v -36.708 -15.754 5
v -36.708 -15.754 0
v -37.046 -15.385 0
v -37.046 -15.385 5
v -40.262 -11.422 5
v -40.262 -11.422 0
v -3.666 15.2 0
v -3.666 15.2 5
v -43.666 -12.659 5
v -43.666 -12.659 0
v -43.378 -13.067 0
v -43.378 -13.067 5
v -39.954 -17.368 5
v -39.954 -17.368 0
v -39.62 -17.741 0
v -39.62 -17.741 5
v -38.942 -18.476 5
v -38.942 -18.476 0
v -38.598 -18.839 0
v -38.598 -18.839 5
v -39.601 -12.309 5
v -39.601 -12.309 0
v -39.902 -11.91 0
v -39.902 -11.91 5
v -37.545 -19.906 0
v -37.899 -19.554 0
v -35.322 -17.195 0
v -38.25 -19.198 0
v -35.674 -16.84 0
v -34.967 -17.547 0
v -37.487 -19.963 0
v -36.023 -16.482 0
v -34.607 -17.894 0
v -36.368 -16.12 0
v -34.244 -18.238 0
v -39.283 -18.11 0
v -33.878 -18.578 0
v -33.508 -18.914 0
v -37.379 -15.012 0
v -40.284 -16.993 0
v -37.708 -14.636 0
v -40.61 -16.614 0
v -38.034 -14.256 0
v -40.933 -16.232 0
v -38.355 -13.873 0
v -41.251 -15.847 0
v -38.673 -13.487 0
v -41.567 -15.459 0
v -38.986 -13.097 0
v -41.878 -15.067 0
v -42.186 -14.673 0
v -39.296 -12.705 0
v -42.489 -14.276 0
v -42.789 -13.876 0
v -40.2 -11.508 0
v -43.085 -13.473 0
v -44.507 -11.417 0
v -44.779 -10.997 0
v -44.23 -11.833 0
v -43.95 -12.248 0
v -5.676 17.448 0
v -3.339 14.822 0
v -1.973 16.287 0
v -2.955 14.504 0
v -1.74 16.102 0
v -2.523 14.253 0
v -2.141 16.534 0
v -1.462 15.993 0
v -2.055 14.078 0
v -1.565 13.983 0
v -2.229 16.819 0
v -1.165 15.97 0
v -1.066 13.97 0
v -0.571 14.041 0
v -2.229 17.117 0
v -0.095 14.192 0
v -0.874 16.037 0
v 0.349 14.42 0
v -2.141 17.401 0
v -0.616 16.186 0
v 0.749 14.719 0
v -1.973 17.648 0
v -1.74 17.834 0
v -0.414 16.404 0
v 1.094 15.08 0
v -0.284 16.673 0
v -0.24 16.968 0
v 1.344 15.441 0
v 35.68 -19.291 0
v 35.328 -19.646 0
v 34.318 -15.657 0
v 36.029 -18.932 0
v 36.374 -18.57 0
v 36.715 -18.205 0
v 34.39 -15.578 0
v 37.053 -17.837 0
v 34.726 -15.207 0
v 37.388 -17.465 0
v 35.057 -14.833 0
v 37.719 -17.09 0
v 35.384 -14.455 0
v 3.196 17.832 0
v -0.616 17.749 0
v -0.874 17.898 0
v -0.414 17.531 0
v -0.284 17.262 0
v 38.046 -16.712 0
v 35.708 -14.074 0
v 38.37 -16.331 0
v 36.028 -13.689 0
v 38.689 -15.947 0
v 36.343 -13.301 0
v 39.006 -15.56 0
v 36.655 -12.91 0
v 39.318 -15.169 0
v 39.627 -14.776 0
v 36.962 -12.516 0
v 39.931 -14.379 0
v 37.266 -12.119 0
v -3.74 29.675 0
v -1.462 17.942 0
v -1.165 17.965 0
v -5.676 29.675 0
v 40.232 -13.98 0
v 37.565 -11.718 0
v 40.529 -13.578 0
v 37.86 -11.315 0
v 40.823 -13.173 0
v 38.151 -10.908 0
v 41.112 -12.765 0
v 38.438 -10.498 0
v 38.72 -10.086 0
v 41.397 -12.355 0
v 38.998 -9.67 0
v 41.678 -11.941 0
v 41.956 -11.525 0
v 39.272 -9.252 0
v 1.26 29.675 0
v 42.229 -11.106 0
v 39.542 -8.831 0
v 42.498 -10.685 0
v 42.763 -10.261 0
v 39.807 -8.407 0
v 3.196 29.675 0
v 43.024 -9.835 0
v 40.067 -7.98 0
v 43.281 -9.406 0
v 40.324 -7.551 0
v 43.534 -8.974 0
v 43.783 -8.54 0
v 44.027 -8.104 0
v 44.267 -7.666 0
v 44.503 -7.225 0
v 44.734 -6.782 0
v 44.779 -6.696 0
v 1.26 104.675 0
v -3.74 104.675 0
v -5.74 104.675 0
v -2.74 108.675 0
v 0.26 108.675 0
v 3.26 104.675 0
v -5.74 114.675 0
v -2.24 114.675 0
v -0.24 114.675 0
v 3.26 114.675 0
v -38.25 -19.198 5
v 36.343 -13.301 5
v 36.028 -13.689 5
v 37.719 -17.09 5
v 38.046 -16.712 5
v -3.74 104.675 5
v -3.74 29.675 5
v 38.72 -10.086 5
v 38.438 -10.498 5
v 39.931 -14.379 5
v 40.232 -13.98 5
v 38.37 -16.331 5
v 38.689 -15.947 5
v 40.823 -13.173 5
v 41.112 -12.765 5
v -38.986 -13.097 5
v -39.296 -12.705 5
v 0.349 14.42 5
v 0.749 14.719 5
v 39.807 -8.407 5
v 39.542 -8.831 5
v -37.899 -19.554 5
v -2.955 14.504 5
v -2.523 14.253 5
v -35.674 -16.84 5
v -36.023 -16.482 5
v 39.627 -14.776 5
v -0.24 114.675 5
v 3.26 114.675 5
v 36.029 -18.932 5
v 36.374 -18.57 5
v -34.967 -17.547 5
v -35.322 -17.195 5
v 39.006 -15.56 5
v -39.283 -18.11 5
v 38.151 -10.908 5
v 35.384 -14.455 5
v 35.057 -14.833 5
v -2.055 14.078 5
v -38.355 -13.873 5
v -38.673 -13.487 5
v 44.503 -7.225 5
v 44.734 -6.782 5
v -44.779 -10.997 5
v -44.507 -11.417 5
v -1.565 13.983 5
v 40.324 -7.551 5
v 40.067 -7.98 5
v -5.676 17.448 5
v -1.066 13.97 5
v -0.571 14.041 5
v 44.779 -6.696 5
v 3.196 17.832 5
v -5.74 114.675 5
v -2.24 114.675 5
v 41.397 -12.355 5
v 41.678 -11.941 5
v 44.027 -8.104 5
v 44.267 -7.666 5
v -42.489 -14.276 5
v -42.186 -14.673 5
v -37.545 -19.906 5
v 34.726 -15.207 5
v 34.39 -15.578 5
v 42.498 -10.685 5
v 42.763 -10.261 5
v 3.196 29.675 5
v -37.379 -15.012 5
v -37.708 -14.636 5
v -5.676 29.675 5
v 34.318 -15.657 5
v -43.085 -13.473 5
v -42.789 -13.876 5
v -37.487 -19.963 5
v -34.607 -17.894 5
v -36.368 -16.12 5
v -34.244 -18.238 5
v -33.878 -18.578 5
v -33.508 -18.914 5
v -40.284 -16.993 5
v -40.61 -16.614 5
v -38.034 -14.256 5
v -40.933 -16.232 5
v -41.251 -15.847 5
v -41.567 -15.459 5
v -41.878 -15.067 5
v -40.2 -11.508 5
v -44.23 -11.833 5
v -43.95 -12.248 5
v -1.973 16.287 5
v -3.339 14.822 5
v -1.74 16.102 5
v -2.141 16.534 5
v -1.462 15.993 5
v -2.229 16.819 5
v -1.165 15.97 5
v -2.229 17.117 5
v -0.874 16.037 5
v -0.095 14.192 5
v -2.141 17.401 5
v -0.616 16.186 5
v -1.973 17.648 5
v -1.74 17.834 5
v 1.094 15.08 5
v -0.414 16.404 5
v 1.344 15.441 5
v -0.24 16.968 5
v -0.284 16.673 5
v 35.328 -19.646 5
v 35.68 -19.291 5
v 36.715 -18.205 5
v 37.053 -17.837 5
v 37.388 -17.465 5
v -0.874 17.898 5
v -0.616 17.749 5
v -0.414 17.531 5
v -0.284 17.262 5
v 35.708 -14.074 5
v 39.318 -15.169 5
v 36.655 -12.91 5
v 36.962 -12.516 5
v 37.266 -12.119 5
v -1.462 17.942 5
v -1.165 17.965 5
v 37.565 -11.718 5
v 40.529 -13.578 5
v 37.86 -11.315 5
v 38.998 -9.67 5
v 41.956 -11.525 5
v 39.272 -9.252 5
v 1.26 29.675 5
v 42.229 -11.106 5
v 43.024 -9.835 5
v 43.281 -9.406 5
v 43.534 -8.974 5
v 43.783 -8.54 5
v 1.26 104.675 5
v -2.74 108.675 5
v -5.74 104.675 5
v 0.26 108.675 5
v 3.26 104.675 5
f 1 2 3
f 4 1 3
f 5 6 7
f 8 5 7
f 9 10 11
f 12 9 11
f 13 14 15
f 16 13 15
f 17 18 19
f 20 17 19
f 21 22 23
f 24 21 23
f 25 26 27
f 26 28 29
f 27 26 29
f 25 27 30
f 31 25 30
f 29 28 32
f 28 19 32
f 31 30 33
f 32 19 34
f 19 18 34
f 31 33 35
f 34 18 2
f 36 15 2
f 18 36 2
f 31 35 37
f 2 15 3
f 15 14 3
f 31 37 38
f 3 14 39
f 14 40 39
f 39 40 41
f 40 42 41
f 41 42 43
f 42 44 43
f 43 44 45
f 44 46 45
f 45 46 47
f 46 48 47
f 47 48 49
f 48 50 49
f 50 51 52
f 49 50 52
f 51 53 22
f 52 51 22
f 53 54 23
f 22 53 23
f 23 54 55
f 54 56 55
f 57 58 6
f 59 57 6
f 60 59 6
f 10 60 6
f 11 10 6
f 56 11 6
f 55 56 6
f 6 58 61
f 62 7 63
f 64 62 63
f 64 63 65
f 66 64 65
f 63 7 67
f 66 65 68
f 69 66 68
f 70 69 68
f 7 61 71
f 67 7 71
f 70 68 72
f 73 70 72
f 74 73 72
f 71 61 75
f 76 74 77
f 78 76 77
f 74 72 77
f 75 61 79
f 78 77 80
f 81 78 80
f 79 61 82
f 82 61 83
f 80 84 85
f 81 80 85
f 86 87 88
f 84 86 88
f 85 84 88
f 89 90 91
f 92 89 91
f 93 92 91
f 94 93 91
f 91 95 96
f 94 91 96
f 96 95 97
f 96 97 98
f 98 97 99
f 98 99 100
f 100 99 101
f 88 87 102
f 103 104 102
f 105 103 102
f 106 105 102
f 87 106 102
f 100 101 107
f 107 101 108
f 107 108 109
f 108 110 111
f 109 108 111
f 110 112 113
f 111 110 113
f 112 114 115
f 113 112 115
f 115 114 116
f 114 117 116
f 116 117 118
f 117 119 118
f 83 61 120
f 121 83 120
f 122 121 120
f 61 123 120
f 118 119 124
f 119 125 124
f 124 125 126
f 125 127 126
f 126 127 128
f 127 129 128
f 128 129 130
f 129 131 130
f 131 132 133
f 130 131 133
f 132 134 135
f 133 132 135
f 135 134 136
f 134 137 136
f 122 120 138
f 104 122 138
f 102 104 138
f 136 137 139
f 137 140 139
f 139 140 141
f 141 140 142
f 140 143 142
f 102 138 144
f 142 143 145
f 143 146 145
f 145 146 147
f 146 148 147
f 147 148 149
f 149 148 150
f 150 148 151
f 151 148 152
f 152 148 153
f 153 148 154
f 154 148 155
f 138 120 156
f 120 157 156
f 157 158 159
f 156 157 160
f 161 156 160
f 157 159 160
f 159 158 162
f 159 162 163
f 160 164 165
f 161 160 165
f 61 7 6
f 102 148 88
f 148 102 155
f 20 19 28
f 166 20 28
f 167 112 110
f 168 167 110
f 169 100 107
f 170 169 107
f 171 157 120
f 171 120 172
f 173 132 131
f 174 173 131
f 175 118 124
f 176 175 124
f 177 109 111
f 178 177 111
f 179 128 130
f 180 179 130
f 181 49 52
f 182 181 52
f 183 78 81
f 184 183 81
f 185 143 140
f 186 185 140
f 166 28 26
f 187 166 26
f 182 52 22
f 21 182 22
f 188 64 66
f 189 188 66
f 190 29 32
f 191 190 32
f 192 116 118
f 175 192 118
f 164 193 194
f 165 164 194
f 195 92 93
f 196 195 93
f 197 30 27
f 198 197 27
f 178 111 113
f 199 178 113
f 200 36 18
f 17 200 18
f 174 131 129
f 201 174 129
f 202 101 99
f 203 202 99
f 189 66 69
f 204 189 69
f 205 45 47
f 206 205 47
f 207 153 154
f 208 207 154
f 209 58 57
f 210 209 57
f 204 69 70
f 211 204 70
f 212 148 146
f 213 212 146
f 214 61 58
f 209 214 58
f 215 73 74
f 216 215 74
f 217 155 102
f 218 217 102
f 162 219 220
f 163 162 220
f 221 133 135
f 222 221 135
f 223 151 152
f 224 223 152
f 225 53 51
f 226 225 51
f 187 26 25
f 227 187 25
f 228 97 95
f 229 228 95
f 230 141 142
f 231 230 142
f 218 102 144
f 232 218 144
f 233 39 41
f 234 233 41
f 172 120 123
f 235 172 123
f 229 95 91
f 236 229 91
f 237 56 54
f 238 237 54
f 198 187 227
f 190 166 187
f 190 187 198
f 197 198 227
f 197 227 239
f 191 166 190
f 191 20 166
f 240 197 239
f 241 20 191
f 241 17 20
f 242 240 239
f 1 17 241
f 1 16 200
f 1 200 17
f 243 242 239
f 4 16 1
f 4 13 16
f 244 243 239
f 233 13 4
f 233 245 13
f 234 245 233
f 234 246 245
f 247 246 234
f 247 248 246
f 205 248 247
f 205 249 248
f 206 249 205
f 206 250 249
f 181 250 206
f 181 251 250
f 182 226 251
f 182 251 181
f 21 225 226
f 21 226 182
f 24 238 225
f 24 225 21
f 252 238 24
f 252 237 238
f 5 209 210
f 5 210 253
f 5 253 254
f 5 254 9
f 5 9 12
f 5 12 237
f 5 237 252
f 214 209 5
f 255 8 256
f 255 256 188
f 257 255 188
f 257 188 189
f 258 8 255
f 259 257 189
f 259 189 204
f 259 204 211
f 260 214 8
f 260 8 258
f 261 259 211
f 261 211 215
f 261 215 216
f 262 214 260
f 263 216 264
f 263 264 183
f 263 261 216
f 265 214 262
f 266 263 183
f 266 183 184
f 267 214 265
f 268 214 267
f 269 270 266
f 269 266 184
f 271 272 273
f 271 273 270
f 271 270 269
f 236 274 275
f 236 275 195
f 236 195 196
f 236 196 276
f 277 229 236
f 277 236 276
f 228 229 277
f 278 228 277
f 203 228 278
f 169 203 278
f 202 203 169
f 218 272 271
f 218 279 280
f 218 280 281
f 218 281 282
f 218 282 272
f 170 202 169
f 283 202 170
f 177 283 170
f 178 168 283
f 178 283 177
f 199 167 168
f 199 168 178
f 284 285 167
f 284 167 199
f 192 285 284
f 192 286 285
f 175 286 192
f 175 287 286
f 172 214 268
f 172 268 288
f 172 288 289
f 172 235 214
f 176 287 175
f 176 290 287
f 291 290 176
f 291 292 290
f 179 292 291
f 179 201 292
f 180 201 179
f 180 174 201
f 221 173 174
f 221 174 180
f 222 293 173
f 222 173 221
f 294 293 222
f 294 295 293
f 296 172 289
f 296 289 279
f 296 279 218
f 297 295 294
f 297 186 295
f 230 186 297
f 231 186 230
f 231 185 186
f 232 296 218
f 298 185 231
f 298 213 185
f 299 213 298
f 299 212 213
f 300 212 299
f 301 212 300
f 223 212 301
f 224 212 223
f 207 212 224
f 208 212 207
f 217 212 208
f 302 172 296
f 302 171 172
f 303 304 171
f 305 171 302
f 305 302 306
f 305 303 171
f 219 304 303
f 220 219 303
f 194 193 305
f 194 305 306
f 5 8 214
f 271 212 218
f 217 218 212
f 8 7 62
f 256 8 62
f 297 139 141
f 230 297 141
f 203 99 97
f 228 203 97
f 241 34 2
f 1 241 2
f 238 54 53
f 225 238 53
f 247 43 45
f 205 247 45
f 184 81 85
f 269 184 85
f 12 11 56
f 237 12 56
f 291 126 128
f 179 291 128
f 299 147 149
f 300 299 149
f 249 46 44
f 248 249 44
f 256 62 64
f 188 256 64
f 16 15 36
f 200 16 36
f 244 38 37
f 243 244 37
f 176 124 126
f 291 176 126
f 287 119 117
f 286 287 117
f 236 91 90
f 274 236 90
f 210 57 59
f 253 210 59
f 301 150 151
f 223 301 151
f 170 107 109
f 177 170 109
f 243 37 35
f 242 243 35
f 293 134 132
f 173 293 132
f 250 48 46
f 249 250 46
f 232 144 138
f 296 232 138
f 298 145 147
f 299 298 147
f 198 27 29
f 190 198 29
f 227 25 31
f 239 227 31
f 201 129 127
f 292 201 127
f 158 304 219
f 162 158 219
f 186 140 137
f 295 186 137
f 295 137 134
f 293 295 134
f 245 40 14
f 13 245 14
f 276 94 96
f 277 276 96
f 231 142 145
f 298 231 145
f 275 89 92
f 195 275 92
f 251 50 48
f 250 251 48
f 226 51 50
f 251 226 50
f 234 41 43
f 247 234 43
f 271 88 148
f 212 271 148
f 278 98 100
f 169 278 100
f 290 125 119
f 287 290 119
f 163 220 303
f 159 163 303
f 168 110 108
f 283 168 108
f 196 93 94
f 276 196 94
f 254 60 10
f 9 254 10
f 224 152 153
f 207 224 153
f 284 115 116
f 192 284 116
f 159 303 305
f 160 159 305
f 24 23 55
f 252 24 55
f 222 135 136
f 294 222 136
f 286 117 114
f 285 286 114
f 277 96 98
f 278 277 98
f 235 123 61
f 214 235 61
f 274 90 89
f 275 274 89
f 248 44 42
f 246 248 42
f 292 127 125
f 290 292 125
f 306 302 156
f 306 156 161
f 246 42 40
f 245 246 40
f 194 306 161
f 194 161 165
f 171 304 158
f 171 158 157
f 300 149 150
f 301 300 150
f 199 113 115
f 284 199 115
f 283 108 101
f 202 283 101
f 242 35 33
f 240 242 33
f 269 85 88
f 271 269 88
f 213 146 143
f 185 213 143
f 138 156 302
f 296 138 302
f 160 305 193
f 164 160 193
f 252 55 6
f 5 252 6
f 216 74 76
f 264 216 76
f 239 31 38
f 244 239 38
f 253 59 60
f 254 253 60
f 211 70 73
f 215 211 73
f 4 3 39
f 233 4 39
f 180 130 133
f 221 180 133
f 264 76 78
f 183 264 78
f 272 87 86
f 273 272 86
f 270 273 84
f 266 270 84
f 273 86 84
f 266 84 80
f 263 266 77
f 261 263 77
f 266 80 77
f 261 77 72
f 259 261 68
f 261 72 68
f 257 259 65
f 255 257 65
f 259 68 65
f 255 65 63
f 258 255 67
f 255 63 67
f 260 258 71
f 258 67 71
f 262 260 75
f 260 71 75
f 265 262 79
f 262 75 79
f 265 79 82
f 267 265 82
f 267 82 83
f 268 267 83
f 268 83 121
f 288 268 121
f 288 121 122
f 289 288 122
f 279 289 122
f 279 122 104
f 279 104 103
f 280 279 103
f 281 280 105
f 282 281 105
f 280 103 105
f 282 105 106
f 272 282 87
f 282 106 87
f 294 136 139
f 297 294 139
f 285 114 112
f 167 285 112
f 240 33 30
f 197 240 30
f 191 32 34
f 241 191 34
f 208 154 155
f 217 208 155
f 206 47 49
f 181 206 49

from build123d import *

# Parameters (mm, degrees)
F1_DEPTH = 5
F2_W     = 5
F2_H     = 5
F3_DEPTH = 85
F4_W     = 2
F4_H     = 10
F5_DEPTH = 5
F6_DEPTH = 5
F7_R     = 1
F8_DEPTH = 10


with BuildPart() as f1:
    # F0 (on Top) → F1 (new body)
    with BuildSketch(Plane.XY):
        Polygon((3.1958913997, 17.8316862418), (3.1958913997, 29.6752474937), (-5.6755073997, 29.6752474937), (-5.6755073997, 17.4481306137), (-3.004598, 19.391063), (-2.590673, 19.643703), (-2.127576, 19.830687), (-1.639877, 19.938255), (-1.14109, 19.963425), (-0.645039, 19.905499), (-0.165471, 19.766083), (0.284322, 19.549041), align=None)
        with BuildLine():
            Line((44.778874, -6.695544), (3.1958913997, 17.8316862418))
            Line((3.1958913997, 17.8316862418), (3.1958913997, 16.96755))
            Line((3.1958913997, 16.96755), (-0.239810875, 16.96755))
            ThreePointArc((-0.239810875, 16.96755), (-1.239808, 15.967552875), (-2.239805125, 16.96755))
            Line((-2.239805125, 16.96755), (-5.6755073997, 16.96755))
            Line((-5.6755073997, 16.96755), (-5.6755073997, 17.4481306137))
            Line((-5.6755073997, 17.4481306137), (-44.778874, -10.997311))
            Line((-44.778874, -10.997311), (-44.506651, -11.416707))
            Line((-44.506651, -11.416707), (-44.230389, -11.833453))
            Line((-44.230389, -11.833453), (-43.950113, -12.24751))
            Line((-43.950113, -12.24751), (-43.66585, -12.65884))
            Line((-43.66585, -12.65884), (-43.377624, -13.067404))
            Line((-43.377624, -13.067404), (-43.085465, -13.473164))
            Line((-43.085465, -13.473164), (-42.789399, -13.876081))
            Line((-42.789399, -13.876081), (-42.489453, -14.276119))
            Line((-42.489453, -14.276119), (-42.185655, -14.673241))
            Line((-42.185655, -14.673241), (-41.878035, -15.067408))
            Line((-41.878035, -15.067408), (-41.56662, -15.458584))
            Line((-41.56662, -15.458584), (-41.25144, -15.846733))
            Line((-41.25144, -15.846733), (-40.932525, -16.231819))
            Line((-40.932525, -16.231819), (-40.609903, -16.613804))
            Line((-40.609903, -16.613804), (-40.283605, -16.992655))
            Line((-40.283605, -16.992655), (-39.953662, -17.368335))
            Line((-39.953662, -17.368335), (-39.620104, -17.74081))
            Line((-39.620104, -17.74081), (-39.282963, -18.110044))
            Line((-39.282963, -18.110044), (-38.942269, -18.476003))
            Line((-38.942269, -18.476003), (-38.598056, -18.838653))
            Line((-38.598056, -18.838653), (-38.250354, -19.19796))
            Line((-38.250354, -19.19796), (-37.899197, -19.553891))
            Line((-37.899197, -19.553891), (-37.544616, -19.906411))
            Line((-37.544616, -19.906411), (-37.486622, -19.963425))
            Line((-37.486622, -19.963425), (-33.507621, -18.914429))
            Line((-33.507621, -18.914429), (-33.877651, -18.578163))
            Line((-33.877651, -18.578163), (-34.244177, -18.23808))
            Line((-34.244177, -18.23808), (-34.60716, -17.894218))
            Line((-34.60716, -17.894218), (-34.966561, -17.546614))
            Line((-34.966561, -17.546614), (-35.322341, -17.195304))
            Line((-35.322341, -17.195304), (-35.674461, -16.840326))
            Line((-35.674461, -16.840326), (-36.022885, -16.481719))
            Line((-36.022885, -16.481719), (-36.367574, -16.119522))
            Line((-36.367574, -16.119522), (-36.708491, -15.753772))
            Line((-36.708491, -15.753772), (-37.045601, -15.384509))
            Line((-37.045601, -15.384509), (-37.378867, -15.011774))
            Line((-37.378867, -15.011774), (-37.708252, -14.635605))
            Line((-37.708252, -14.635605), (-38.033722, -14.256044))
            Line((-38.033722, -14.256044), (-38.355242, -13.87313))
            Line((-38.355242, -13.87313), (-38.672778, -13.486906))
            Line((-38.672778, -13.486906), (-38.986294, -13.097412))
            Line((-38.986294, -13.097412), (-39.295758, -12.704691))
            Line((-39.295758, -12.704691), (-39.601136, -12.308785))
            Line((-39.601136, -12.308785), (-39.902395, -11.909735))
            Line((-39.902395, -11.909735), (-40.199504, -11.507586))
            Line((-40.199504, -11.507586), (-40.262255, -11.421522))
            Line((-40.262255, -11.421522), (-3.665827, 15.200266))
            Line((-3.665827, 15.200266), (-3.339439, 14.822254))
            Line((-3.339439, 14.822254), (-2.954863, 14.503627))
            Line((-2.954863, 14.503627), (-2.522758, 14.253214))
            Line((-2.522758, 14.253214), (-2.055097, 14.077956))
            Line((-2.055097, 14.077956), (-1.564842, 13.982709))
            Line((-1.564842, 13.982709), (-1.06558, 13.970114))
            Line((-1.06558, 13.970114), (-0.571146, 14.040519))
            Line((-0.571146, 14.040519), (-0.095243, 14.191973))
            Line((-0.095243, 14.191973), (0.34894, 14.420279))
            Line((0.34894, 14.420279), (0.749093, 14.719109))
            Line((0.749093, 14.719109), (1.094126, 15.080183))
            Line((1.094126, 15.080183), (1.344177, 15.440914))
            Line((1.344177, 15.440914), (40.323708, -7.550701))
            Line((40.323708, -7.550701), (40.067458, -7.980043))
            Line((40.067458, -7.980043), (39.806774, -8.406706))
            Line((39.806774, -8.406706), (39.541683, -8.830645))
            Line((39.541683, -8.830645), (39.272214, -9.251815))
            Line((39.272214, -9.251815), (38.998395, -9.67017))
            Line((38.998395, -9.67017), (38.720256, -10.085665))
            Line((38.720256, -10.085665), (38.437827, -10.498257))
            Line((38.437827, -10.498257), (38.151138, -10.907899))
            Line((38.151138, -10.907899), (37.86022, -11.31455))
            Line((37.86022, -11.31455), (37.565104, -11.718164))
            Line((37.565104, -11.718164), (37.265821, -12.118698))
            Line((37.265821, -12.118698), (36.962405, -12.51611))
            Line((36.962405, -12.51611), (36.654888, -12.910357))
            Line((36.654888, -12.910357), (36.343302, -13.301397))
            Line((36.343302, -13.301397), (36.02768, -13.689187))
            Line((36.02768, -13.689187), (35.708058, -14.073686))
            Line((35.708058, -14.073686), (35.384469, -14.454852))
            Line((35.384469, -14.454852), (35.056948, -14.832646))
            Line((35.056948, -14.832646), (34.72553, -15.207025))
            Line((34.72553, -15.207025), (34.390251, -15.57795))
            Line((34.390251, -15.57795), (34.318334, -15.656515))
            Line((34.318334, -15.656515), (35.327871, -19.64571))
            Line((35.327871, -19.64571), (35.67992, -19.290661))
            Line((35.67992, -19.290661), (36.028522, -18.932227))
            Line((36.028522, -18.932227), (36.373644, -18.570442))
            Line((36.373644, -18.570442), (36.715254, -18.205338))
            Line((36.715254, -18.205338), (37.05332, -17.836951))
            Line((37.05332, -17.836951), (37.387811, -17.465314))
            Line((37.387811, -17.465314), (37.718695, -17.090462))
            Line((37.718695, -17.090462), (38.045942, -16.712431))
            Line((38.045942, -16.712431), (38.369521, -16.331256))
            Line((38.369521, -16.331256), (38.689401, -15.946971))
            Line((38.689401, -15.946971), (39.005553, -15.559614))
            Line((39.005553, -15.559614), (39.317948, -15.16922))
            Line((39.317948, -15.16922), (39.626556, -14.775825))
            Line((39.626556, -14.775825), (39.931348, -14.379467))
            Line((39.931348, -14.379467), (40.232296, -13.980182))
            Line((40.232296, -13.980182), (40.529372, -13.578008))
            Line((40.529372, -13.578008), (40.822549, -13.172983))
            Line((40.822549, -13.172983), (41.111797, -12.765143))
            Line((41.111797, -12.765143), (41.397092, -12.354527))
            Line((41.397092, -12.354527), (41.678405, -11.941174))
            Line((41.678405, -11.941174), (41.955712, -11.525122))
            Line((41.955712, -11.525122), (42.228985, -11.10641))
            Line((42.228985, -11.10641), (42.498199, -10.685077))
            Line((42.498199, -10.685077), (42.76333, -10.261162))
            Line((42.76333, -10.261162), (43.024353, -9.834706))
            Line((43.024353, -9.834706), (43.281242, -9.405747))
            Line((43.281242, -9.405747), (43.533975, -8.974325))
            Line((43.533975, -8.974325), (43.782527, -8.540482))
            Line((43.782527, -8.540482), (44.026875, -8.104258))
            Line((44.026875, -8.104258), (44.266997, -7.665692))
            Line((44.266997, -7.665692), (44.50287, -7.224827))
            Line((44.50287, -7.224827), (44.734473, -6.781704))
            Line((44.734473, -6.781704), (44.778874, -6.695544))
        make_face()
        with BuildLine():
            Line((3.1958913997, 16.96755), (3.1958913997, 17.8316862418))
            Line((3.1958913997, 17.8316862418), (0.284322, 19.549041))
            Line((0.284322, 19.549041), (-0.165471, 19.766083))
            Line((-0.165471, 19.766083), (-0.645039, 19.905499))
            Line((-0.645039, 19.905499), (-1.14109, 19.963425))
            Line((-1.14109, 19.963425), (-1.639877, 19.938255))
            Line((-1.639877, 19.938255), (-2.127576, 19.830687))
            Line((-2.127576, 19.830687), (-2.590673, 19.643703))
            Line((-2.590673, 19.643703), (-3.004598, 19.391063))
            Line((-3.004598, 19.391063), (-5.6755073997, 17.4481306137))
            Line((-5.6755073997, 17.4481306137), (-5.6755073997, 16.96755))
            Line((-5.6755073997, 16.96755), (-2.239805125, 16.96755))
            ThreePointArc((-2.239805125, 16.96755), (-1.239808, 17.967547125), (-0.239810875, 16.96755))
            Line((-0.239810875, 16.96755), (3.1958913997, 16.96755))
        make_face()
    extrude(amount=F1_DEPTH)

    # F2 (on face) → F3 (join)
    with BuildSketch(Plane(origin=(0, 29.6752474937, 0), x_dir=(-1, 0, 0), z_dir=(0, 1, 0))):
        with Locations((1.239808, 2.5)):
            Rectangle(F2_W, F2_H)
    extrude(amount=F3_DEPTH)

    # F4 (on face) → F5 (join)
    with BuildSketch(Plane.XY.offset(5)):
        with Locations((-4.739808, 109.6752474937)):
            Rectangle(F4_W, F4_H)
        with Locations((2.260192, 109.6752474937)):
            Rectangle(F4_W, F4_H)
    extrude(amount=-F5_DEPTH)

    # F4 (on face) → F6 (cut)
    with BuildSketch(Plane.XY.offset(5)):
        Polygon((-0.239808, 114.6752474937), (-2.239808, 114.6752474937), (-2.739808, 108.6752474937), (0.260192, 108.6752474937), align=None)
    extrude(amount=-F6_DEPTH, mode=Mode.SUBTRACT)

    # F7 (on face) → F8 (cut)
    with BuildSketch(Plane.YZ.offset(3.260192)):
        with Locations((121.0267286794, 2.5)):
            Circle(F7_R)
    extrude(amount=-F8_DEPTH, mode=Mode.SUBTRACT)


solid = f1.part
